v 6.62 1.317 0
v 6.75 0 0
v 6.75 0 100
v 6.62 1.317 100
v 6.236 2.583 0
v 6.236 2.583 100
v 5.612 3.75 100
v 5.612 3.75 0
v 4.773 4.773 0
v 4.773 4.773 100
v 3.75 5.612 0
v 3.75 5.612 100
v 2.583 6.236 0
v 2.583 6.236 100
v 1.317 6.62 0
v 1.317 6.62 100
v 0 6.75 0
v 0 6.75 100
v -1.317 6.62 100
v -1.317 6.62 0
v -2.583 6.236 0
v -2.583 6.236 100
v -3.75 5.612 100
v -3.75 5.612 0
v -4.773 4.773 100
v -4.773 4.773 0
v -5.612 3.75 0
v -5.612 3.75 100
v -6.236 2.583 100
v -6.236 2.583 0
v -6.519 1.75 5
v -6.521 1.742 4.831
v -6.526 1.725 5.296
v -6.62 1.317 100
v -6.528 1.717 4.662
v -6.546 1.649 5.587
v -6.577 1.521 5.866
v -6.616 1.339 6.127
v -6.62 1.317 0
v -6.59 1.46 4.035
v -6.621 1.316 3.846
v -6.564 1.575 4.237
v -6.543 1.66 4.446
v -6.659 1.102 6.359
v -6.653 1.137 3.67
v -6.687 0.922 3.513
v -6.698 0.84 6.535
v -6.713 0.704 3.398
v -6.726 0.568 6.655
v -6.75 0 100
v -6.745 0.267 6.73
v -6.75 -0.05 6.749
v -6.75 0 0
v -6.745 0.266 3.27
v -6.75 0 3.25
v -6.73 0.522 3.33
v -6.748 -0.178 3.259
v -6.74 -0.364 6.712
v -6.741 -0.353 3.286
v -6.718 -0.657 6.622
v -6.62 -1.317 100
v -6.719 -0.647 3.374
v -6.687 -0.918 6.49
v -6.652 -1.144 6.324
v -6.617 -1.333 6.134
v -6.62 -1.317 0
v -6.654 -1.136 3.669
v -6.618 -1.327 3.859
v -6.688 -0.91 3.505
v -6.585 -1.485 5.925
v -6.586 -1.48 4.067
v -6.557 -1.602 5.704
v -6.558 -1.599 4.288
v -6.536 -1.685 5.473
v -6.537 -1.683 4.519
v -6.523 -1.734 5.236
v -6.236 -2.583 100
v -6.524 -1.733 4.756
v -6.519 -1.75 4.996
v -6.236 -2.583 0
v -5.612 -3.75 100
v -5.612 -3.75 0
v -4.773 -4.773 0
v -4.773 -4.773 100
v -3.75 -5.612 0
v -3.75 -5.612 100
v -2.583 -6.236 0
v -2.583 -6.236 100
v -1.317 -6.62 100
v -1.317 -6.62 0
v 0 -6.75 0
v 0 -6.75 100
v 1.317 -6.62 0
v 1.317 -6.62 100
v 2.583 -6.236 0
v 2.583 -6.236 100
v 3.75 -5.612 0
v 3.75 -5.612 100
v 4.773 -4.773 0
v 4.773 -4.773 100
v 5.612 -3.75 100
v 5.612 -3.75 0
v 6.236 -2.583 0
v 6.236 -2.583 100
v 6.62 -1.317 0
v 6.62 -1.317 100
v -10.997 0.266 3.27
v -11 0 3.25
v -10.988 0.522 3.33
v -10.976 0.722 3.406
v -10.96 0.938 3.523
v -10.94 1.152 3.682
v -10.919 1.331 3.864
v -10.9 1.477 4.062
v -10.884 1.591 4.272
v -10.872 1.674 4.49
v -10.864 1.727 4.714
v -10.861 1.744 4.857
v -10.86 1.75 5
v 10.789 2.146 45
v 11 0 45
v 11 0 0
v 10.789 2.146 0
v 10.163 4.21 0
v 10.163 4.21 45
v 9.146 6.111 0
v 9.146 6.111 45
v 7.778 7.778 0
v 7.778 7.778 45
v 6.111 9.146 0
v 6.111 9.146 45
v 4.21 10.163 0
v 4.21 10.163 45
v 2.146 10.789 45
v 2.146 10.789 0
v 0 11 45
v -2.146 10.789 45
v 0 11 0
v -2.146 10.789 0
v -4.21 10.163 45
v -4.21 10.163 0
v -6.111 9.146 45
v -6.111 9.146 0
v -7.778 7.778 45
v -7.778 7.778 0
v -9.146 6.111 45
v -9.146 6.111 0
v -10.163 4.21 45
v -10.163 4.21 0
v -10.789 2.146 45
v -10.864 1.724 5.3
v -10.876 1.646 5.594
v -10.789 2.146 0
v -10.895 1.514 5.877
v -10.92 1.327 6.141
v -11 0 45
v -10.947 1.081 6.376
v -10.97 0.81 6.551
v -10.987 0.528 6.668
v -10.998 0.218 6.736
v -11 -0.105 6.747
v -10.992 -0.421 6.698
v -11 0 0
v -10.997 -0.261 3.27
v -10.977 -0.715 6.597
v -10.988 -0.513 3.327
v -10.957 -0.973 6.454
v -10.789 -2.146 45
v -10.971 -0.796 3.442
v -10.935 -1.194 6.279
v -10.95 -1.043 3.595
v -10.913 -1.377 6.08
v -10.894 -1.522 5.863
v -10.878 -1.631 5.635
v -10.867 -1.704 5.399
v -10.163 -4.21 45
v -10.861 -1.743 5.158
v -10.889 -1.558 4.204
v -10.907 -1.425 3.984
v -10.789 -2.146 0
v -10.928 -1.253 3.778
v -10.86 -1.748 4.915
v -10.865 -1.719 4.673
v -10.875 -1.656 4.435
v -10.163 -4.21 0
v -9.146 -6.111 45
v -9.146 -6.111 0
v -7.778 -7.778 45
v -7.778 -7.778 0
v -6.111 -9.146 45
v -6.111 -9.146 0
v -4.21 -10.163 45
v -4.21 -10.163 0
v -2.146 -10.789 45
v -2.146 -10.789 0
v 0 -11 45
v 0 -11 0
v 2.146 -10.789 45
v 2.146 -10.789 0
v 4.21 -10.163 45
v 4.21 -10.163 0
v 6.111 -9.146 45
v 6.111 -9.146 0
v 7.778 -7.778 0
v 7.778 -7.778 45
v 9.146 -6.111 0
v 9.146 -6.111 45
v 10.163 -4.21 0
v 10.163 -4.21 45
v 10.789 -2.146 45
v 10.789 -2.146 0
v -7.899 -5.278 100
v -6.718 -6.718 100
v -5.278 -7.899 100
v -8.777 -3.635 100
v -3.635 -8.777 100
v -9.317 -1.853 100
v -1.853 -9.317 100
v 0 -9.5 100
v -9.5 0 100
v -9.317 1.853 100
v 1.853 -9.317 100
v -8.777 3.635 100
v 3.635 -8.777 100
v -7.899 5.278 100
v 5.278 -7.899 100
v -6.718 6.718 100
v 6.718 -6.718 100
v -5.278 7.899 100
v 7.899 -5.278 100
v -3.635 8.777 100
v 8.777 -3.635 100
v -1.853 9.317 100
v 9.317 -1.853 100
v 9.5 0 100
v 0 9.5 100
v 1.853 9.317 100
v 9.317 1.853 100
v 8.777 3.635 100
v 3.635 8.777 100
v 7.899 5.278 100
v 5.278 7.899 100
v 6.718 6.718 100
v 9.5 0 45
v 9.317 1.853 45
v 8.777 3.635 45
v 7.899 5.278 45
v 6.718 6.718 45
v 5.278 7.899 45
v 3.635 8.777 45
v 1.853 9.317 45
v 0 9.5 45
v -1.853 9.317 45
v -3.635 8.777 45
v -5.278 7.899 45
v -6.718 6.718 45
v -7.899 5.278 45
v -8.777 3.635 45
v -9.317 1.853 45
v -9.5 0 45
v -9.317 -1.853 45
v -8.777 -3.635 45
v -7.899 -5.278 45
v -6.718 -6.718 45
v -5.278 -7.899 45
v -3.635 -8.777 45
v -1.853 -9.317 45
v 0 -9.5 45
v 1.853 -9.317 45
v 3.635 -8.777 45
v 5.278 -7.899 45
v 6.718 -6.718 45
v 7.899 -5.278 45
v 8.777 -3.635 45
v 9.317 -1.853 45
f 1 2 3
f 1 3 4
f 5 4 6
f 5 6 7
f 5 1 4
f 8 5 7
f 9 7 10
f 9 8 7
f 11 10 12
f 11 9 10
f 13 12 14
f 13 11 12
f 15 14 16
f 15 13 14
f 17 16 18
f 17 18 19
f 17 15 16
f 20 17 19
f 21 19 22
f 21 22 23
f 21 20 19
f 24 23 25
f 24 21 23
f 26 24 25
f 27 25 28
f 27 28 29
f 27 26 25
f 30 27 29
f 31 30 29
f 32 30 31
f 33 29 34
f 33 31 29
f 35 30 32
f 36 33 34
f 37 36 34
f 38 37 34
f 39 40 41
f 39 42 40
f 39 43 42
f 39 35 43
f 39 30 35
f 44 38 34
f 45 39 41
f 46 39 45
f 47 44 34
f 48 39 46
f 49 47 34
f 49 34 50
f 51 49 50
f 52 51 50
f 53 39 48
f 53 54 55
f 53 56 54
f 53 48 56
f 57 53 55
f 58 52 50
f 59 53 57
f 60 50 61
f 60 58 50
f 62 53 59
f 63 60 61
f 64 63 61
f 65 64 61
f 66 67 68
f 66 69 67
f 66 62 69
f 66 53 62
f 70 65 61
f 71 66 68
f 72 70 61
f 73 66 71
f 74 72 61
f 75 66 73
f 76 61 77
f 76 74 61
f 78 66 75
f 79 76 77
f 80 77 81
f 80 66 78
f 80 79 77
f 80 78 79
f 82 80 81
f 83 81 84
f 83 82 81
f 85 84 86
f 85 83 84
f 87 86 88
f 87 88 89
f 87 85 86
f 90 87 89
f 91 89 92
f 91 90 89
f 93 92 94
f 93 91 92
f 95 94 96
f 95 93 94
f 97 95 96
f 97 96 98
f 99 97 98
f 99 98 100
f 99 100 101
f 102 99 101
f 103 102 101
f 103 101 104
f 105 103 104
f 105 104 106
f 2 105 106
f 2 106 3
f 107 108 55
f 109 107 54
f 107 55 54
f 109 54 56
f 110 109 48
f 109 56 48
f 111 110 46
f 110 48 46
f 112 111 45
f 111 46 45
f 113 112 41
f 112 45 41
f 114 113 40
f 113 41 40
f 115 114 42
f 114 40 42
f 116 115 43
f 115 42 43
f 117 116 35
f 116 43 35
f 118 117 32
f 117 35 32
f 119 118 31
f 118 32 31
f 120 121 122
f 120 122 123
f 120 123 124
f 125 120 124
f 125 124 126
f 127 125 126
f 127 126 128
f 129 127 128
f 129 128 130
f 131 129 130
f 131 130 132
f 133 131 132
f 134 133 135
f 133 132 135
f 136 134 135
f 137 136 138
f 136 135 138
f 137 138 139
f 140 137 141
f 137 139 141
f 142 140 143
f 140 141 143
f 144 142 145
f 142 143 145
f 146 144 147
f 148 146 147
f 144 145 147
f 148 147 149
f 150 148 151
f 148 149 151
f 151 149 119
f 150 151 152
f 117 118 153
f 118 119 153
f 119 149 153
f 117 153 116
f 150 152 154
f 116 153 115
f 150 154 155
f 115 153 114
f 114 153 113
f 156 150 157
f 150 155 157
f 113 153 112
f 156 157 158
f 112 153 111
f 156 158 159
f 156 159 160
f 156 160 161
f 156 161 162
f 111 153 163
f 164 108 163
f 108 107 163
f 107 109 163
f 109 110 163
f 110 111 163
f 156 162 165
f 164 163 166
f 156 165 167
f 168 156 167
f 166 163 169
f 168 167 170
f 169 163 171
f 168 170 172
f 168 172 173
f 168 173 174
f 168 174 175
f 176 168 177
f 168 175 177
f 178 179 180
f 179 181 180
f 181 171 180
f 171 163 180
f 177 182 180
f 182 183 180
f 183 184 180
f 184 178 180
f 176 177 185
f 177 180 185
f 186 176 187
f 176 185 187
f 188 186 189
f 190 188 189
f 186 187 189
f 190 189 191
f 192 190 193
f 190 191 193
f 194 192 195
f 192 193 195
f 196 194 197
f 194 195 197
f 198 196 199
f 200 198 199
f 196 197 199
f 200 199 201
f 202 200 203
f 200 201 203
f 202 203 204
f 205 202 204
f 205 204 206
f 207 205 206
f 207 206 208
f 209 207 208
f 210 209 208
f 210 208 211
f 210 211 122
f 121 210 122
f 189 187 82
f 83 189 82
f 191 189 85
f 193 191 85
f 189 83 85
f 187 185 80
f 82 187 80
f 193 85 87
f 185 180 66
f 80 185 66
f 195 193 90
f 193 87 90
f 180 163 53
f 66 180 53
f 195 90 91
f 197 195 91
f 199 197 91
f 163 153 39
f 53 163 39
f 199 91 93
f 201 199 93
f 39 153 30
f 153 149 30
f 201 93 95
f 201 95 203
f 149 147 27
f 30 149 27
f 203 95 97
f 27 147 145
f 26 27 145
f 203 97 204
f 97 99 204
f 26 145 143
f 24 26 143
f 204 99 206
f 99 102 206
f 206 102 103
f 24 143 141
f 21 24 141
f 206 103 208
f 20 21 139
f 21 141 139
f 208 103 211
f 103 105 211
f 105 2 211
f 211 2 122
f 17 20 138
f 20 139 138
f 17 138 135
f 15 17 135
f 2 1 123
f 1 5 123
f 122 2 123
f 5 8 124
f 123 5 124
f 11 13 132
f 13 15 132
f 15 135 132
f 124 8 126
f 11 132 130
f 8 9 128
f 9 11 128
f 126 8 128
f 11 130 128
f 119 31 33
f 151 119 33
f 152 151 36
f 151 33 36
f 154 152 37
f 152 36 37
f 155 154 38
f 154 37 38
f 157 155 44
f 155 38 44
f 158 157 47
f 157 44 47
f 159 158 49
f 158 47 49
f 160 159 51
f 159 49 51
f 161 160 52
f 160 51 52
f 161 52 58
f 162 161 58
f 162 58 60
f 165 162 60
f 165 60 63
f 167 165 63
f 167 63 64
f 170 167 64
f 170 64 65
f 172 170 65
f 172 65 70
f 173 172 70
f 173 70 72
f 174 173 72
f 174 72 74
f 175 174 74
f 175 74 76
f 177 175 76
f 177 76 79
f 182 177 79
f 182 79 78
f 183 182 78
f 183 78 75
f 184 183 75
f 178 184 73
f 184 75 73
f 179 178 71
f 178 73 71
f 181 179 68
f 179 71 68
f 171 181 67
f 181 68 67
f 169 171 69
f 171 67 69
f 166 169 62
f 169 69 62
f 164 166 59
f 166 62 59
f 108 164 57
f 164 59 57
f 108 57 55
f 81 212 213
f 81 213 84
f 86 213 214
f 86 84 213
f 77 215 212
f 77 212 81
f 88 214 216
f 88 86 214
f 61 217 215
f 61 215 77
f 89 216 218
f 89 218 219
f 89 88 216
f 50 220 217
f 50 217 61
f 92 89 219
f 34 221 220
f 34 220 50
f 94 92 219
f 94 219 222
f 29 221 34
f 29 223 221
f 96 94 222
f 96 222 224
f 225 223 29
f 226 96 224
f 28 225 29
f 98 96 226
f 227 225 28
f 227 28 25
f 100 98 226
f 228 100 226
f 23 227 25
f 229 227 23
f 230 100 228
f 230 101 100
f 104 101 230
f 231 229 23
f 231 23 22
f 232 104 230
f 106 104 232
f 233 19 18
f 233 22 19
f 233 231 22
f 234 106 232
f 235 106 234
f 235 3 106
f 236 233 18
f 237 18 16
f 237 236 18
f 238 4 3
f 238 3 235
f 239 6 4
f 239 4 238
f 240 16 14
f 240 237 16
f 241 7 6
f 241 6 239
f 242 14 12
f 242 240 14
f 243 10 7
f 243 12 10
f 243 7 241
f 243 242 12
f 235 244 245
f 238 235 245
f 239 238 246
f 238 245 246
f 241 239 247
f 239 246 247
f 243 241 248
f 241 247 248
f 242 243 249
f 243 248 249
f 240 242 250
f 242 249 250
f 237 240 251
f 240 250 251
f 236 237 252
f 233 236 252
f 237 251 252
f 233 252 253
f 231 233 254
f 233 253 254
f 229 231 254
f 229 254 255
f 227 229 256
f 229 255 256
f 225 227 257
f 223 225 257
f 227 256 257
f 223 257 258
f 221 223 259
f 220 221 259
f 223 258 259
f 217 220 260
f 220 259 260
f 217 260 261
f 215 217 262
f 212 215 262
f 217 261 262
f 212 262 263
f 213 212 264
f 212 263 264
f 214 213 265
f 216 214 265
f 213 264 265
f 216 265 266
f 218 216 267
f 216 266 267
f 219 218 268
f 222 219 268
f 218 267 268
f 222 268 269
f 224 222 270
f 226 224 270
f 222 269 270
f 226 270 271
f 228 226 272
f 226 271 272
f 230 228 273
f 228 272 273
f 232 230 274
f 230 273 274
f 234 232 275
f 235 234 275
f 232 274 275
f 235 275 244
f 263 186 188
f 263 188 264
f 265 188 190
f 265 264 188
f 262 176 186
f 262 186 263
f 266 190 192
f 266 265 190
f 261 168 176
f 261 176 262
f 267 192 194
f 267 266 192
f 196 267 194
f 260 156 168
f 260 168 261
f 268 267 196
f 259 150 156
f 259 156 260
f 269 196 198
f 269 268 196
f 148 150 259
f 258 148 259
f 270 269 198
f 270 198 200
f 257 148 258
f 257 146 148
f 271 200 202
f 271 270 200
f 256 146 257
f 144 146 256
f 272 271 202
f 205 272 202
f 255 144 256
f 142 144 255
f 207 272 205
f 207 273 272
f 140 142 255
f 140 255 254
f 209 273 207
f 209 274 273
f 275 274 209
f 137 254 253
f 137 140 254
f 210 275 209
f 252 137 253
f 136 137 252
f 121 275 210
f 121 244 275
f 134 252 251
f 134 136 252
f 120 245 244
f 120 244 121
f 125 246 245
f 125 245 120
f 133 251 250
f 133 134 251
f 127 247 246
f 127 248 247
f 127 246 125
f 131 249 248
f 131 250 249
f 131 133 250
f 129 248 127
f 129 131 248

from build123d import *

# Parameters (mm, degrees)
F0_R     = 11
F0_R_2   = 6.75
F1_DEPTH = 45
F2_R     = 9.5
F2_R_2   = 6.75
F3_DEPTH = 55
F5_DEPTH = 12.0000001


with BuildPart() as f1:
    # F0 (on Top) → F1 (new body)
    with BuildSketch(Plane.XY):
        Circle(F0_R)
        Circle(F0_R_2, mode=Mode.SUBTRACT)
    extrude(amount=F1_DEPTH)

    # F2 (on face) → F3 (join)
    with BuildSketch(Plane.XY.offset(45)):
        Circle(F2_R)
        Circle(F2_R_2, mode=Mode.SUBTRACT)
    extrude(amount=F3_DEPTH)

    # F4 (on Right) → F5 (cut, up to face)
    with BuildSketch(Plane.YZ):
        with BuildLine():
            ThreePointArc((0, 3.25), (1.2374368671, 3.7625631329), (1.75, 5))
            ThreePointArc((1.75, 5), (-1.2374368671, 6.2374368671), (0, 3.25))
        make_face()
    extrude(amount=-F5_DEPTH, mode=Mode.SUBTRACT)


solid = f1.part
